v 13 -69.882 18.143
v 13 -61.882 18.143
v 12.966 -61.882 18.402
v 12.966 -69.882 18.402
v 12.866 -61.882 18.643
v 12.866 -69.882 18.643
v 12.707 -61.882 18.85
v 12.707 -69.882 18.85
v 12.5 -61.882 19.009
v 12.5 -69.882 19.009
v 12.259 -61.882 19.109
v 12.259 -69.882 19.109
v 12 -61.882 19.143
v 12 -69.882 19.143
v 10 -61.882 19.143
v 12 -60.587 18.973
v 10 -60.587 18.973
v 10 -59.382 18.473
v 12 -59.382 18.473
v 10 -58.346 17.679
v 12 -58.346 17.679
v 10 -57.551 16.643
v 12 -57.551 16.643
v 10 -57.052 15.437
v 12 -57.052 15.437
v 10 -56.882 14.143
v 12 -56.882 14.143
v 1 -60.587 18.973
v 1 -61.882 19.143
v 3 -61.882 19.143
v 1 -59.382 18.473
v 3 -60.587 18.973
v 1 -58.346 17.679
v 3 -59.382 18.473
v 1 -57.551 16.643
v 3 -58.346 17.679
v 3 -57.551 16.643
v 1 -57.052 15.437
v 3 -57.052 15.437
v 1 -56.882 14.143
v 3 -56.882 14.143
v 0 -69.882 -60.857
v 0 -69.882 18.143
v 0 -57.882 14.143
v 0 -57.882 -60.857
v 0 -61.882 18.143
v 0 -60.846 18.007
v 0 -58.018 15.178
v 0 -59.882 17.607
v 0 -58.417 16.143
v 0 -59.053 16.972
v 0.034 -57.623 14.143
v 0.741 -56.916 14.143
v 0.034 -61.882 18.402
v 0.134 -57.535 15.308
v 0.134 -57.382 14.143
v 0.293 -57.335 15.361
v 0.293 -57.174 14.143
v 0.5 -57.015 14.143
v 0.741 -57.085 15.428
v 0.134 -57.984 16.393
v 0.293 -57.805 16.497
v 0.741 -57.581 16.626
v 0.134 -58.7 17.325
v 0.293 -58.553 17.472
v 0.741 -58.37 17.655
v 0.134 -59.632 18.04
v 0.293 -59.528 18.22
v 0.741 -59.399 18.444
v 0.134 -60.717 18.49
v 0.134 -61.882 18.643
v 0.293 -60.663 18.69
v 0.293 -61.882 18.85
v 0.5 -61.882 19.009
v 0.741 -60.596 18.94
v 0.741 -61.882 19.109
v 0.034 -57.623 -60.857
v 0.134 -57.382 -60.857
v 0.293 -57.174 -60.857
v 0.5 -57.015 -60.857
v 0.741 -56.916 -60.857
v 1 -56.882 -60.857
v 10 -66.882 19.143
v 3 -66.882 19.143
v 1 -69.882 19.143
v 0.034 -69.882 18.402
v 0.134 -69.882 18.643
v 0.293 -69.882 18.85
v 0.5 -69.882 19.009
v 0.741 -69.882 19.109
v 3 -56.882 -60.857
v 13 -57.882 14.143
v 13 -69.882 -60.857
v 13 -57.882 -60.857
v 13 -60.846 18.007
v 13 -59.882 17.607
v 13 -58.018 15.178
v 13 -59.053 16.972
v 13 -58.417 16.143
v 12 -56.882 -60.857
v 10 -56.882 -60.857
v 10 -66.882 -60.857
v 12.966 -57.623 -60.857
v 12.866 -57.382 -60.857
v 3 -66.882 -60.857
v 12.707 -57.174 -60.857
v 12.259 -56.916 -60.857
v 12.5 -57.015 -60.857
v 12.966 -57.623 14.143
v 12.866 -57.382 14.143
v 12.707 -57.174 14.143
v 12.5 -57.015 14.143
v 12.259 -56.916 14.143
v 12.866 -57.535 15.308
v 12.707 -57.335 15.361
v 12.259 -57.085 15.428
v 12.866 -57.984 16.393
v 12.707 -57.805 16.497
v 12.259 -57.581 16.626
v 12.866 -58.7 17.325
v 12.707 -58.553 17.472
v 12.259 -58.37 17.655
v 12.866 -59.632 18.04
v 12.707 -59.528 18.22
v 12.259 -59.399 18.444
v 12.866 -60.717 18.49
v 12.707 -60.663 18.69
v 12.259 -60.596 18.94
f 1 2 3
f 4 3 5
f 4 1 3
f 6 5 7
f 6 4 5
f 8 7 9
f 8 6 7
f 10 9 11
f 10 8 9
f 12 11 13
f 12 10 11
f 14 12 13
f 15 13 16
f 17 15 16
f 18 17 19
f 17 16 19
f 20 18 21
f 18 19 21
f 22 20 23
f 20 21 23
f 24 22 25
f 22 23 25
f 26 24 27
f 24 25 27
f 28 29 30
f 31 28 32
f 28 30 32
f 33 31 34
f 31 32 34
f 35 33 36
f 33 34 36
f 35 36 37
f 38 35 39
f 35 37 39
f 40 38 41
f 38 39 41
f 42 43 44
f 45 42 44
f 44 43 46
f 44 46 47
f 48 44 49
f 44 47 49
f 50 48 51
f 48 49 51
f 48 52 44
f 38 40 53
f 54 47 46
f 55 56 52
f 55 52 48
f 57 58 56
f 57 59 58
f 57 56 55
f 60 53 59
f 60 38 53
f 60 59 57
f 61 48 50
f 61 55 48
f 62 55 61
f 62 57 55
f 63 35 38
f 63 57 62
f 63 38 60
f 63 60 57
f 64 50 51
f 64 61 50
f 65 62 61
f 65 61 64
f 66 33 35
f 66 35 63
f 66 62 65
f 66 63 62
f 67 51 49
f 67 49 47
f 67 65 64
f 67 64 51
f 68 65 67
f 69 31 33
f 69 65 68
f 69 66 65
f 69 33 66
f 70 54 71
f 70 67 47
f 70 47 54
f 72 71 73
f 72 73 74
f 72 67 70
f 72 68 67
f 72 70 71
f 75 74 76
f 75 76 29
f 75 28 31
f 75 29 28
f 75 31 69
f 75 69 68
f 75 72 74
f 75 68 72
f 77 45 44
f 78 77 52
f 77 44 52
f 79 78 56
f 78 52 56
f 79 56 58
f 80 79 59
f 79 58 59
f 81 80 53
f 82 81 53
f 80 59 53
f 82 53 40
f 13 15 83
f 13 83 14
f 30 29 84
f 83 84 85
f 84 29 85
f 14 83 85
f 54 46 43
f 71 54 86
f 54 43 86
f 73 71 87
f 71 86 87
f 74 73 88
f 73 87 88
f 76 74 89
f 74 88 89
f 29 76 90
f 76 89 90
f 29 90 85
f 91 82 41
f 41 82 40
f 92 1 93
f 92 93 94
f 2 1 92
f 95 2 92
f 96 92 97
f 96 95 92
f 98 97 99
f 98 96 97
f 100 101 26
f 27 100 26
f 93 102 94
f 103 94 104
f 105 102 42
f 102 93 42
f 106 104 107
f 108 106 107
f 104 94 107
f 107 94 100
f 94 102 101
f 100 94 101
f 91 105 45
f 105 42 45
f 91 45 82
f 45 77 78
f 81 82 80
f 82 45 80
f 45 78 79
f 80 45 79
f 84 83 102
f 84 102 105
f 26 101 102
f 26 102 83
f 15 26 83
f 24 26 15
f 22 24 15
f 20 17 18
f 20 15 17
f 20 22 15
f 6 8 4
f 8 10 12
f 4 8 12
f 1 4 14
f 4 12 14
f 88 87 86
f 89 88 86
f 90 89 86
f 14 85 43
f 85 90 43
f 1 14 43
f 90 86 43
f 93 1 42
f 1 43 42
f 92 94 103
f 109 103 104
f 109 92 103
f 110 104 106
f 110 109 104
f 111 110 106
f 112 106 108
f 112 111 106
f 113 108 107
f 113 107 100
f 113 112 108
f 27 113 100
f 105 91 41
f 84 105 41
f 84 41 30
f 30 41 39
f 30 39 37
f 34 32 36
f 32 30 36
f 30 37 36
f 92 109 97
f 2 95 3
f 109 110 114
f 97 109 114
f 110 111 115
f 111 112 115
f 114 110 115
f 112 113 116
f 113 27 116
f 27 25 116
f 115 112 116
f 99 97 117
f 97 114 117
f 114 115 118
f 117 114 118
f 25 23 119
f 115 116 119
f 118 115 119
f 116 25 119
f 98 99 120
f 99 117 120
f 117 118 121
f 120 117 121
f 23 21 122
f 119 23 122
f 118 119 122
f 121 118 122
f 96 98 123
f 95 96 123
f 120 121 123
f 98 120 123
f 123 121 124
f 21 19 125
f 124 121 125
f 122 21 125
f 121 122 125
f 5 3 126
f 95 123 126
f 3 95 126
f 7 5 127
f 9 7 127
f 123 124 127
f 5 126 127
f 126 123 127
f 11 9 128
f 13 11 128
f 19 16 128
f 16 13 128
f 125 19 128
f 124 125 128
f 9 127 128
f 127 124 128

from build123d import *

# Parameters (mm, degrees)
F1_DEPTH = 13
F2_R     = 5
F3_R     = 1
F4_W     = 7
F4_H     = 80.0645950389
F5_DEPTH = 10


with BuildPart() as f1:
    # F0 (on Right) → F1 (new body)
    with BuildSketch(Plane.YZ):
        Polygon((-56.8815148667, 19.1431619976), (-69.8815148667, 19.1431619976), (-69.8815148667, -60.8568380024), (-56.8815148667, -60.8568380024), (-56.8815148667, -47.8568380024), align=None)
    extrude(amount=F1_DEPTH)

    # F2
    f2_edges = [f1.edges().sort_by_distance(p)[0] for p in [
        (6.5, -56.881515, 19.143162),
    ]]
    fillet(f2_edges, radius=F2_R)

    # F3
    f3_edges = [f1.edges().sort_by_distance(p)[0] for p in [
        (0, -56.881515, -23.356838),
        (13, -56.881515, -23.356838),
        (0, -65.881515, 19.143162),
        (13, -65.881515, 19.143162),
        (0, -58.345981, 17.678696),
        (13, -58.345981, 17.678696),
    ]]
    fillet(f3_edges, radius=F3_R)

    # F4 (on face) → F5 (cut)
    with BuildSketch(Plane(origin=(0, -56.8815148667, 0), x_dir=(-1, 0, 0), z_dir=(0, 1, 0))):
        with Locations((-6.5, -20.824540483)):
            Rectangle(F4_W, F4_H)
    extrude(amount=-F5_DEPTH, mode=Mode.SUBTRACT)


solid = f1.part
